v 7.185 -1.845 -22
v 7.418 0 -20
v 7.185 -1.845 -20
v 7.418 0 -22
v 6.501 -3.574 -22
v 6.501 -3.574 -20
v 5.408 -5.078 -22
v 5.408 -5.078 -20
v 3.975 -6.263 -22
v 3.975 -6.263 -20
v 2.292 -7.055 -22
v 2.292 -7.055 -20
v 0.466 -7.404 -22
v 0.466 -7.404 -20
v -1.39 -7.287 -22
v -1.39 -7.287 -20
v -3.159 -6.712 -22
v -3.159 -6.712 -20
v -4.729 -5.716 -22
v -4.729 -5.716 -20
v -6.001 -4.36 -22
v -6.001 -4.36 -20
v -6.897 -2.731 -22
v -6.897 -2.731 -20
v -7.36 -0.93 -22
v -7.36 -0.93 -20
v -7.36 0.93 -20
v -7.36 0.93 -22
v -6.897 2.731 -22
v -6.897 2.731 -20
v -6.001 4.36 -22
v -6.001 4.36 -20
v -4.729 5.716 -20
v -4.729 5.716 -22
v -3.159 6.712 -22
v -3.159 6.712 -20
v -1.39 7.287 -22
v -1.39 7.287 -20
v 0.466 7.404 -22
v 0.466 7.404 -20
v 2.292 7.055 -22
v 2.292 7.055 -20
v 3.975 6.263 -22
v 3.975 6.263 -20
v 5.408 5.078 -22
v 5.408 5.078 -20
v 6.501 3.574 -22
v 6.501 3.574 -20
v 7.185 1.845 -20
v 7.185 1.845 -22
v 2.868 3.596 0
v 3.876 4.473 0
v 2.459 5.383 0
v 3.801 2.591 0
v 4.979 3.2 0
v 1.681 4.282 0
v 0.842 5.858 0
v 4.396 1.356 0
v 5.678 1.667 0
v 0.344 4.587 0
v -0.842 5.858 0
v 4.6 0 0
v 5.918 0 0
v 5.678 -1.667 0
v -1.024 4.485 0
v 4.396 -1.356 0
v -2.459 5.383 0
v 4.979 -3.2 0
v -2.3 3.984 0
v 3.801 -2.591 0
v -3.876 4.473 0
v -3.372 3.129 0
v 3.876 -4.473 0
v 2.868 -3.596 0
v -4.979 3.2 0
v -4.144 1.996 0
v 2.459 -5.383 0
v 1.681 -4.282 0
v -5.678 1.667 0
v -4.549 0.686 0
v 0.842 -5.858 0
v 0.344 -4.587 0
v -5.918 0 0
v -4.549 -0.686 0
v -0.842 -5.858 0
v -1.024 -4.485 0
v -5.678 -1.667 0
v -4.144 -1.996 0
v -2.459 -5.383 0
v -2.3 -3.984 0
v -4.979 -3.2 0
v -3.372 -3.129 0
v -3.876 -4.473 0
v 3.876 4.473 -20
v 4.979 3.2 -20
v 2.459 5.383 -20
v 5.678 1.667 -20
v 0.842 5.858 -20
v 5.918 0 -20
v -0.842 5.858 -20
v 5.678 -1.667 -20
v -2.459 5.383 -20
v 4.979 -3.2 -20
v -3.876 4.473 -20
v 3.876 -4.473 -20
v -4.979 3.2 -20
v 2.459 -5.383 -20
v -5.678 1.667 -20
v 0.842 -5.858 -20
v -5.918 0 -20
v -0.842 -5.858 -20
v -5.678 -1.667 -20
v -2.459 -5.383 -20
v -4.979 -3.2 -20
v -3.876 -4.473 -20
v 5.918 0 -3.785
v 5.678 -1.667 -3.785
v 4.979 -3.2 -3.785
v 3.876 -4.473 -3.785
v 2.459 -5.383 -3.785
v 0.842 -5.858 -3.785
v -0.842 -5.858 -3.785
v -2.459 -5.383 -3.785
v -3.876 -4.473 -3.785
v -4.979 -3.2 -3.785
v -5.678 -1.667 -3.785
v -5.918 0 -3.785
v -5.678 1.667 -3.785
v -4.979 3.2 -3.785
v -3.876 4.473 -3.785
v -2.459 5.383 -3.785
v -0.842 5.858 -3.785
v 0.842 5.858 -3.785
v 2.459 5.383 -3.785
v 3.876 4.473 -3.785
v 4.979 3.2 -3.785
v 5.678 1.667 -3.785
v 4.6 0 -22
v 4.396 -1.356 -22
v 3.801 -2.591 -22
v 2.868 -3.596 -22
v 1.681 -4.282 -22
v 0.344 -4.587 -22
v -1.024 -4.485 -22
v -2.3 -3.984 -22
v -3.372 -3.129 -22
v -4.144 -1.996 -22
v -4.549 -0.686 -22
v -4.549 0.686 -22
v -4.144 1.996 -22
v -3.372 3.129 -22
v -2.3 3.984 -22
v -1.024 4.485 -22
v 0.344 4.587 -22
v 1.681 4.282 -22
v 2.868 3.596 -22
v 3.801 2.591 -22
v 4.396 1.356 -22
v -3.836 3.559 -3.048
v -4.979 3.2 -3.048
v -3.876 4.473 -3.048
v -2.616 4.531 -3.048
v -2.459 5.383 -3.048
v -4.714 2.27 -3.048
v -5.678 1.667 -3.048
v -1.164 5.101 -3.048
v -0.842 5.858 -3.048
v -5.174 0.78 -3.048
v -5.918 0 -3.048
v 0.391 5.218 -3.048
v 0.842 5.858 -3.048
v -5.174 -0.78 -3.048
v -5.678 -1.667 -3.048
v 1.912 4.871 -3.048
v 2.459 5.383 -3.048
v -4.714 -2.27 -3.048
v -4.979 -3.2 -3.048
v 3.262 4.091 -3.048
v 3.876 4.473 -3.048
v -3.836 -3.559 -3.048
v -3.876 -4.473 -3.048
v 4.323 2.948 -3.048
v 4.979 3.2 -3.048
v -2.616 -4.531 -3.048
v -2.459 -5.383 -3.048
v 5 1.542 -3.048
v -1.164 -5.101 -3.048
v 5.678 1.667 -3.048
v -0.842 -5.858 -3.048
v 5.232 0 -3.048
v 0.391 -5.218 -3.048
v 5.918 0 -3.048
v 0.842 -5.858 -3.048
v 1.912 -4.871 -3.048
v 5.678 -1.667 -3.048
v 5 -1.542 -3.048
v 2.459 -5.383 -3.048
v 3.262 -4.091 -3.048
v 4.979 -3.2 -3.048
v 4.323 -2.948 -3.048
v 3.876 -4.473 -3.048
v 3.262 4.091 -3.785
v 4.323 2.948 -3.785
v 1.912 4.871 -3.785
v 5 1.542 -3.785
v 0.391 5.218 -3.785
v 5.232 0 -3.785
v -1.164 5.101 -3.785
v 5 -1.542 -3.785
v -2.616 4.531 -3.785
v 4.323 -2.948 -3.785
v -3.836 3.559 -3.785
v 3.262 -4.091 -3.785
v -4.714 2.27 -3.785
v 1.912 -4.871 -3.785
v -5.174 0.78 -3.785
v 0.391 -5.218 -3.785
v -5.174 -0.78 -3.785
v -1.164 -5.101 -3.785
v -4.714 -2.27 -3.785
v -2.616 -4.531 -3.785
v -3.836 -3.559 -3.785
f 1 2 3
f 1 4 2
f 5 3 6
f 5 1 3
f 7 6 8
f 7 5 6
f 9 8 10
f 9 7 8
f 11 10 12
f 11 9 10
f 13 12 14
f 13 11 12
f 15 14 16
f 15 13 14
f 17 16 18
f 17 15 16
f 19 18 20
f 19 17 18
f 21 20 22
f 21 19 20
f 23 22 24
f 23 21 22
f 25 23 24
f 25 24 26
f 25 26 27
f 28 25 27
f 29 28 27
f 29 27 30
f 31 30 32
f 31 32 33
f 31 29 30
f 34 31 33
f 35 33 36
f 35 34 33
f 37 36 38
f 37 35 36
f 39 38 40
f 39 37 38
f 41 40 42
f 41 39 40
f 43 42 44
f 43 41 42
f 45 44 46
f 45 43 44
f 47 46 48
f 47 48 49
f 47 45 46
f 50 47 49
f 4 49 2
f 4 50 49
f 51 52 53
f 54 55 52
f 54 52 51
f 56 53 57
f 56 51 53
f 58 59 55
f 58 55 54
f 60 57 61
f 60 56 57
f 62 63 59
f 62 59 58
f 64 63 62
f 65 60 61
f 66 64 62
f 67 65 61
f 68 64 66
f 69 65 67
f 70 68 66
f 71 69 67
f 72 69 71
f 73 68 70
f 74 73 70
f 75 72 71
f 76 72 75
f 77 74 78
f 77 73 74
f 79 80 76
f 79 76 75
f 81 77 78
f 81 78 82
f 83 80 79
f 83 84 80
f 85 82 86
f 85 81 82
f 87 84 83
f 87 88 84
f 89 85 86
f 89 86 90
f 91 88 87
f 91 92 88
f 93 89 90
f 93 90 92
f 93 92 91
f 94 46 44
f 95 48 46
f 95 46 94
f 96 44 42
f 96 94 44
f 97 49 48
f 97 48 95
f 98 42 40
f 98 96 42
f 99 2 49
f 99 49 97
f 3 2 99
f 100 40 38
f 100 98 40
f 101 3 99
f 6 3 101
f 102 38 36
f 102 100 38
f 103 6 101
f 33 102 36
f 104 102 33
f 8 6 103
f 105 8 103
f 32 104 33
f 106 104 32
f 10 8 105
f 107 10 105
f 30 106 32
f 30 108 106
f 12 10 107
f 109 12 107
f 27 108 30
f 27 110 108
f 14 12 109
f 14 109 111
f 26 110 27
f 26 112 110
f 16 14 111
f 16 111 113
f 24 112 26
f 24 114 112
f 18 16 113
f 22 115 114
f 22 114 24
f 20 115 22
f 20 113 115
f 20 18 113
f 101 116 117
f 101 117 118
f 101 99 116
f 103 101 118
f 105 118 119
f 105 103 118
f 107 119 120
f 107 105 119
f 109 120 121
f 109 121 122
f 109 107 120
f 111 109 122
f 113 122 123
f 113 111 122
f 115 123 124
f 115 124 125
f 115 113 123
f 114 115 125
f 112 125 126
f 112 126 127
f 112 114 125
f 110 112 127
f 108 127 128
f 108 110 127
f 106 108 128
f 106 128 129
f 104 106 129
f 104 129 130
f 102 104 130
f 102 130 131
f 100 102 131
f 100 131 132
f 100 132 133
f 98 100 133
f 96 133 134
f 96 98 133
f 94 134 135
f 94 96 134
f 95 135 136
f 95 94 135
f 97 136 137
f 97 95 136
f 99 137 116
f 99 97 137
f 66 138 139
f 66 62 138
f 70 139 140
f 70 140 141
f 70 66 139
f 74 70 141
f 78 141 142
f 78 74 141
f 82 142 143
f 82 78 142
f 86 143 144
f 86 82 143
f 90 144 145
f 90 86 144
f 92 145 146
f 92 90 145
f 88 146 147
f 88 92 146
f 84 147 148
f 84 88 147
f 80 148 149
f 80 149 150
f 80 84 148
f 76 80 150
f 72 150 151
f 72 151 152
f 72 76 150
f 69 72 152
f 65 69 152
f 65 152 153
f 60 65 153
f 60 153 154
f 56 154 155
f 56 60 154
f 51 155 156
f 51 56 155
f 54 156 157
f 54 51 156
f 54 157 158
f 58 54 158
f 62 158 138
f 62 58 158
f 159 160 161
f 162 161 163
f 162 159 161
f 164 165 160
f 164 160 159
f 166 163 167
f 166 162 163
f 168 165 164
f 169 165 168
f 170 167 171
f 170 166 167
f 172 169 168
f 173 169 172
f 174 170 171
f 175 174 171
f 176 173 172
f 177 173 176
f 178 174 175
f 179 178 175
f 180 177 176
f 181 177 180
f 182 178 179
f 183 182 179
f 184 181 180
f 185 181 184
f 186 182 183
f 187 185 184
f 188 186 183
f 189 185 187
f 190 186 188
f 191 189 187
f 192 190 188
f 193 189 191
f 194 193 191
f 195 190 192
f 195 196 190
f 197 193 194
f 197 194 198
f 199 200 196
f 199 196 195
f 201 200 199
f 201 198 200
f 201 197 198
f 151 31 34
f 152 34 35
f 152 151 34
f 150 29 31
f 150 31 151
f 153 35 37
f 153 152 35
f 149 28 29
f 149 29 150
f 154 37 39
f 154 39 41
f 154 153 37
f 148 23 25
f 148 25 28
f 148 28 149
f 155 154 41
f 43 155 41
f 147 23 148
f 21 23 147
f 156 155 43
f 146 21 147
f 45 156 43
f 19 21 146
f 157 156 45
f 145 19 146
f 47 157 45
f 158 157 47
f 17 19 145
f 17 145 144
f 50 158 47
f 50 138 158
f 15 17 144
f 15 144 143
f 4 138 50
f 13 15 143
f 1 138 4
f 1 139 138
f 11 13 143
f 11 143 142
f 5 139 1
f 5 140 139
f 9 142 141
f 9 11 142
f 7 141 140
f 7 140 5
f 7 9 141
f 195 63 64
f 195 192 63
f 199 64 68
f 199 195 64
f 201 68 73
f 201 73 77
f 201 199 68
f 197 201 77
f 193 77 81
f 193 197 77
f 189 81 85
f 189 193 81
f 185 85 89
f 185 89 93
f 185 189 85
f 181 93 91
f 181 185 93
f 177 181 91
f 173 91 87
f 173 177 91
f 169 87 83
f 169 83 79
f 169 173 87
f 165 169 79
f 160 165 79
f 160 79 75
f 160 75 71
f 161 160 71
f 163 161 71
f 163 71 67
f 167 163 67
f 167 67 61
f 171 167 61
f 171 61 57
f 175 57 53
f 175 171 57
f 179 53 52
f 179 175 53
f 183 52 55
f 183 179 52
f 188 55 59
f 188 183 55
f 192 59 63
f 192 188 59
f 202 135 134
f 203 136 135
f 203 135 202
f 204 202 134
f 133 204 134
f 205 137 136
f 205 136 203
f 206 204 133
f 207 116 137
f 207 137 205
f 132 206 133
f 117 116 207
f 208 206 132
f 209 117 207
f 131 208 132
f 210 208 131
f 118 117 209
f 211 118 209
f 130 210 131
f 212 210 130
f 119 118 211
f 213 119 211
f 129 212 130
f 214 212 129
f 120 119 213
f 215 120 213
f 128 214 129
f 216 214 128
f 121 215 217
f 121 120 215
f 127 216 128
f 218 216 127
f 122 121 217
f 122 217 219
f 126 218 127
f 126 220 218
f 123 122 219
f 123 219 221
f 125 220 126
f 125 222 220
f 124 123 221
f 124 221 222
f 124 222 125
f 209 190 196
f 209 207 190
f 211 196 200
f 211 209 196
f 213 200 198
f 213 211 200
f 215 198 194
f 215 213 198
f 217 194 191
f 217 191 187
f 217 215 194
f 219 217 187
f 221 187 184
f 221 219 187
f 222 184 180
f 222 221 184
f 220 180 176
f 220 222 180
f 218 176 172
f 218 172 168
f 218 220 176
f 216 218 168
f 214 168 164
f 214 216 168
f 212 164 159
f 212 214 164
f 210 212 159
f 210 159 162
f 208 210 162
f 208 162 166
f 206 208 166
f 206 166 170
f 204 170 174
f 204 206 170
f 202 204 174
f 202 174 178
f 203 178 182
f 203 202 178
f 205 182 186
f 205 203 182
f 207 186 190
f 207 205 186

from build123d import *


with BuildPart() as part:
    # Sketch1 → Revolve1 (revolve)
    with BuildSketch(Plane(origin=(0, 0, 0), x_dir=(0, 0, -1), z_dir=(1, 0, 0)), mode=Mode.PRIVATE) as revolve1_sk:
        Polygon((0, 5.9182), (3.048, 5.9182), (3.048, 5.2324), (3.7846, 5.2324), (3.7846, 5.9182), (20, 5.9182), (20, 7.4182), (22, 7.4182), (22, 4.6), (0, 4.6), align=None)
    revolve(revolve1_sk.sketch.rotate(Axis((0, 0, 0), (0, 0, -1)), 90), axis=Axis((0, 0, 0), (0, 0, -1)))  # turned: the seam where the file's is


solid = part.part
